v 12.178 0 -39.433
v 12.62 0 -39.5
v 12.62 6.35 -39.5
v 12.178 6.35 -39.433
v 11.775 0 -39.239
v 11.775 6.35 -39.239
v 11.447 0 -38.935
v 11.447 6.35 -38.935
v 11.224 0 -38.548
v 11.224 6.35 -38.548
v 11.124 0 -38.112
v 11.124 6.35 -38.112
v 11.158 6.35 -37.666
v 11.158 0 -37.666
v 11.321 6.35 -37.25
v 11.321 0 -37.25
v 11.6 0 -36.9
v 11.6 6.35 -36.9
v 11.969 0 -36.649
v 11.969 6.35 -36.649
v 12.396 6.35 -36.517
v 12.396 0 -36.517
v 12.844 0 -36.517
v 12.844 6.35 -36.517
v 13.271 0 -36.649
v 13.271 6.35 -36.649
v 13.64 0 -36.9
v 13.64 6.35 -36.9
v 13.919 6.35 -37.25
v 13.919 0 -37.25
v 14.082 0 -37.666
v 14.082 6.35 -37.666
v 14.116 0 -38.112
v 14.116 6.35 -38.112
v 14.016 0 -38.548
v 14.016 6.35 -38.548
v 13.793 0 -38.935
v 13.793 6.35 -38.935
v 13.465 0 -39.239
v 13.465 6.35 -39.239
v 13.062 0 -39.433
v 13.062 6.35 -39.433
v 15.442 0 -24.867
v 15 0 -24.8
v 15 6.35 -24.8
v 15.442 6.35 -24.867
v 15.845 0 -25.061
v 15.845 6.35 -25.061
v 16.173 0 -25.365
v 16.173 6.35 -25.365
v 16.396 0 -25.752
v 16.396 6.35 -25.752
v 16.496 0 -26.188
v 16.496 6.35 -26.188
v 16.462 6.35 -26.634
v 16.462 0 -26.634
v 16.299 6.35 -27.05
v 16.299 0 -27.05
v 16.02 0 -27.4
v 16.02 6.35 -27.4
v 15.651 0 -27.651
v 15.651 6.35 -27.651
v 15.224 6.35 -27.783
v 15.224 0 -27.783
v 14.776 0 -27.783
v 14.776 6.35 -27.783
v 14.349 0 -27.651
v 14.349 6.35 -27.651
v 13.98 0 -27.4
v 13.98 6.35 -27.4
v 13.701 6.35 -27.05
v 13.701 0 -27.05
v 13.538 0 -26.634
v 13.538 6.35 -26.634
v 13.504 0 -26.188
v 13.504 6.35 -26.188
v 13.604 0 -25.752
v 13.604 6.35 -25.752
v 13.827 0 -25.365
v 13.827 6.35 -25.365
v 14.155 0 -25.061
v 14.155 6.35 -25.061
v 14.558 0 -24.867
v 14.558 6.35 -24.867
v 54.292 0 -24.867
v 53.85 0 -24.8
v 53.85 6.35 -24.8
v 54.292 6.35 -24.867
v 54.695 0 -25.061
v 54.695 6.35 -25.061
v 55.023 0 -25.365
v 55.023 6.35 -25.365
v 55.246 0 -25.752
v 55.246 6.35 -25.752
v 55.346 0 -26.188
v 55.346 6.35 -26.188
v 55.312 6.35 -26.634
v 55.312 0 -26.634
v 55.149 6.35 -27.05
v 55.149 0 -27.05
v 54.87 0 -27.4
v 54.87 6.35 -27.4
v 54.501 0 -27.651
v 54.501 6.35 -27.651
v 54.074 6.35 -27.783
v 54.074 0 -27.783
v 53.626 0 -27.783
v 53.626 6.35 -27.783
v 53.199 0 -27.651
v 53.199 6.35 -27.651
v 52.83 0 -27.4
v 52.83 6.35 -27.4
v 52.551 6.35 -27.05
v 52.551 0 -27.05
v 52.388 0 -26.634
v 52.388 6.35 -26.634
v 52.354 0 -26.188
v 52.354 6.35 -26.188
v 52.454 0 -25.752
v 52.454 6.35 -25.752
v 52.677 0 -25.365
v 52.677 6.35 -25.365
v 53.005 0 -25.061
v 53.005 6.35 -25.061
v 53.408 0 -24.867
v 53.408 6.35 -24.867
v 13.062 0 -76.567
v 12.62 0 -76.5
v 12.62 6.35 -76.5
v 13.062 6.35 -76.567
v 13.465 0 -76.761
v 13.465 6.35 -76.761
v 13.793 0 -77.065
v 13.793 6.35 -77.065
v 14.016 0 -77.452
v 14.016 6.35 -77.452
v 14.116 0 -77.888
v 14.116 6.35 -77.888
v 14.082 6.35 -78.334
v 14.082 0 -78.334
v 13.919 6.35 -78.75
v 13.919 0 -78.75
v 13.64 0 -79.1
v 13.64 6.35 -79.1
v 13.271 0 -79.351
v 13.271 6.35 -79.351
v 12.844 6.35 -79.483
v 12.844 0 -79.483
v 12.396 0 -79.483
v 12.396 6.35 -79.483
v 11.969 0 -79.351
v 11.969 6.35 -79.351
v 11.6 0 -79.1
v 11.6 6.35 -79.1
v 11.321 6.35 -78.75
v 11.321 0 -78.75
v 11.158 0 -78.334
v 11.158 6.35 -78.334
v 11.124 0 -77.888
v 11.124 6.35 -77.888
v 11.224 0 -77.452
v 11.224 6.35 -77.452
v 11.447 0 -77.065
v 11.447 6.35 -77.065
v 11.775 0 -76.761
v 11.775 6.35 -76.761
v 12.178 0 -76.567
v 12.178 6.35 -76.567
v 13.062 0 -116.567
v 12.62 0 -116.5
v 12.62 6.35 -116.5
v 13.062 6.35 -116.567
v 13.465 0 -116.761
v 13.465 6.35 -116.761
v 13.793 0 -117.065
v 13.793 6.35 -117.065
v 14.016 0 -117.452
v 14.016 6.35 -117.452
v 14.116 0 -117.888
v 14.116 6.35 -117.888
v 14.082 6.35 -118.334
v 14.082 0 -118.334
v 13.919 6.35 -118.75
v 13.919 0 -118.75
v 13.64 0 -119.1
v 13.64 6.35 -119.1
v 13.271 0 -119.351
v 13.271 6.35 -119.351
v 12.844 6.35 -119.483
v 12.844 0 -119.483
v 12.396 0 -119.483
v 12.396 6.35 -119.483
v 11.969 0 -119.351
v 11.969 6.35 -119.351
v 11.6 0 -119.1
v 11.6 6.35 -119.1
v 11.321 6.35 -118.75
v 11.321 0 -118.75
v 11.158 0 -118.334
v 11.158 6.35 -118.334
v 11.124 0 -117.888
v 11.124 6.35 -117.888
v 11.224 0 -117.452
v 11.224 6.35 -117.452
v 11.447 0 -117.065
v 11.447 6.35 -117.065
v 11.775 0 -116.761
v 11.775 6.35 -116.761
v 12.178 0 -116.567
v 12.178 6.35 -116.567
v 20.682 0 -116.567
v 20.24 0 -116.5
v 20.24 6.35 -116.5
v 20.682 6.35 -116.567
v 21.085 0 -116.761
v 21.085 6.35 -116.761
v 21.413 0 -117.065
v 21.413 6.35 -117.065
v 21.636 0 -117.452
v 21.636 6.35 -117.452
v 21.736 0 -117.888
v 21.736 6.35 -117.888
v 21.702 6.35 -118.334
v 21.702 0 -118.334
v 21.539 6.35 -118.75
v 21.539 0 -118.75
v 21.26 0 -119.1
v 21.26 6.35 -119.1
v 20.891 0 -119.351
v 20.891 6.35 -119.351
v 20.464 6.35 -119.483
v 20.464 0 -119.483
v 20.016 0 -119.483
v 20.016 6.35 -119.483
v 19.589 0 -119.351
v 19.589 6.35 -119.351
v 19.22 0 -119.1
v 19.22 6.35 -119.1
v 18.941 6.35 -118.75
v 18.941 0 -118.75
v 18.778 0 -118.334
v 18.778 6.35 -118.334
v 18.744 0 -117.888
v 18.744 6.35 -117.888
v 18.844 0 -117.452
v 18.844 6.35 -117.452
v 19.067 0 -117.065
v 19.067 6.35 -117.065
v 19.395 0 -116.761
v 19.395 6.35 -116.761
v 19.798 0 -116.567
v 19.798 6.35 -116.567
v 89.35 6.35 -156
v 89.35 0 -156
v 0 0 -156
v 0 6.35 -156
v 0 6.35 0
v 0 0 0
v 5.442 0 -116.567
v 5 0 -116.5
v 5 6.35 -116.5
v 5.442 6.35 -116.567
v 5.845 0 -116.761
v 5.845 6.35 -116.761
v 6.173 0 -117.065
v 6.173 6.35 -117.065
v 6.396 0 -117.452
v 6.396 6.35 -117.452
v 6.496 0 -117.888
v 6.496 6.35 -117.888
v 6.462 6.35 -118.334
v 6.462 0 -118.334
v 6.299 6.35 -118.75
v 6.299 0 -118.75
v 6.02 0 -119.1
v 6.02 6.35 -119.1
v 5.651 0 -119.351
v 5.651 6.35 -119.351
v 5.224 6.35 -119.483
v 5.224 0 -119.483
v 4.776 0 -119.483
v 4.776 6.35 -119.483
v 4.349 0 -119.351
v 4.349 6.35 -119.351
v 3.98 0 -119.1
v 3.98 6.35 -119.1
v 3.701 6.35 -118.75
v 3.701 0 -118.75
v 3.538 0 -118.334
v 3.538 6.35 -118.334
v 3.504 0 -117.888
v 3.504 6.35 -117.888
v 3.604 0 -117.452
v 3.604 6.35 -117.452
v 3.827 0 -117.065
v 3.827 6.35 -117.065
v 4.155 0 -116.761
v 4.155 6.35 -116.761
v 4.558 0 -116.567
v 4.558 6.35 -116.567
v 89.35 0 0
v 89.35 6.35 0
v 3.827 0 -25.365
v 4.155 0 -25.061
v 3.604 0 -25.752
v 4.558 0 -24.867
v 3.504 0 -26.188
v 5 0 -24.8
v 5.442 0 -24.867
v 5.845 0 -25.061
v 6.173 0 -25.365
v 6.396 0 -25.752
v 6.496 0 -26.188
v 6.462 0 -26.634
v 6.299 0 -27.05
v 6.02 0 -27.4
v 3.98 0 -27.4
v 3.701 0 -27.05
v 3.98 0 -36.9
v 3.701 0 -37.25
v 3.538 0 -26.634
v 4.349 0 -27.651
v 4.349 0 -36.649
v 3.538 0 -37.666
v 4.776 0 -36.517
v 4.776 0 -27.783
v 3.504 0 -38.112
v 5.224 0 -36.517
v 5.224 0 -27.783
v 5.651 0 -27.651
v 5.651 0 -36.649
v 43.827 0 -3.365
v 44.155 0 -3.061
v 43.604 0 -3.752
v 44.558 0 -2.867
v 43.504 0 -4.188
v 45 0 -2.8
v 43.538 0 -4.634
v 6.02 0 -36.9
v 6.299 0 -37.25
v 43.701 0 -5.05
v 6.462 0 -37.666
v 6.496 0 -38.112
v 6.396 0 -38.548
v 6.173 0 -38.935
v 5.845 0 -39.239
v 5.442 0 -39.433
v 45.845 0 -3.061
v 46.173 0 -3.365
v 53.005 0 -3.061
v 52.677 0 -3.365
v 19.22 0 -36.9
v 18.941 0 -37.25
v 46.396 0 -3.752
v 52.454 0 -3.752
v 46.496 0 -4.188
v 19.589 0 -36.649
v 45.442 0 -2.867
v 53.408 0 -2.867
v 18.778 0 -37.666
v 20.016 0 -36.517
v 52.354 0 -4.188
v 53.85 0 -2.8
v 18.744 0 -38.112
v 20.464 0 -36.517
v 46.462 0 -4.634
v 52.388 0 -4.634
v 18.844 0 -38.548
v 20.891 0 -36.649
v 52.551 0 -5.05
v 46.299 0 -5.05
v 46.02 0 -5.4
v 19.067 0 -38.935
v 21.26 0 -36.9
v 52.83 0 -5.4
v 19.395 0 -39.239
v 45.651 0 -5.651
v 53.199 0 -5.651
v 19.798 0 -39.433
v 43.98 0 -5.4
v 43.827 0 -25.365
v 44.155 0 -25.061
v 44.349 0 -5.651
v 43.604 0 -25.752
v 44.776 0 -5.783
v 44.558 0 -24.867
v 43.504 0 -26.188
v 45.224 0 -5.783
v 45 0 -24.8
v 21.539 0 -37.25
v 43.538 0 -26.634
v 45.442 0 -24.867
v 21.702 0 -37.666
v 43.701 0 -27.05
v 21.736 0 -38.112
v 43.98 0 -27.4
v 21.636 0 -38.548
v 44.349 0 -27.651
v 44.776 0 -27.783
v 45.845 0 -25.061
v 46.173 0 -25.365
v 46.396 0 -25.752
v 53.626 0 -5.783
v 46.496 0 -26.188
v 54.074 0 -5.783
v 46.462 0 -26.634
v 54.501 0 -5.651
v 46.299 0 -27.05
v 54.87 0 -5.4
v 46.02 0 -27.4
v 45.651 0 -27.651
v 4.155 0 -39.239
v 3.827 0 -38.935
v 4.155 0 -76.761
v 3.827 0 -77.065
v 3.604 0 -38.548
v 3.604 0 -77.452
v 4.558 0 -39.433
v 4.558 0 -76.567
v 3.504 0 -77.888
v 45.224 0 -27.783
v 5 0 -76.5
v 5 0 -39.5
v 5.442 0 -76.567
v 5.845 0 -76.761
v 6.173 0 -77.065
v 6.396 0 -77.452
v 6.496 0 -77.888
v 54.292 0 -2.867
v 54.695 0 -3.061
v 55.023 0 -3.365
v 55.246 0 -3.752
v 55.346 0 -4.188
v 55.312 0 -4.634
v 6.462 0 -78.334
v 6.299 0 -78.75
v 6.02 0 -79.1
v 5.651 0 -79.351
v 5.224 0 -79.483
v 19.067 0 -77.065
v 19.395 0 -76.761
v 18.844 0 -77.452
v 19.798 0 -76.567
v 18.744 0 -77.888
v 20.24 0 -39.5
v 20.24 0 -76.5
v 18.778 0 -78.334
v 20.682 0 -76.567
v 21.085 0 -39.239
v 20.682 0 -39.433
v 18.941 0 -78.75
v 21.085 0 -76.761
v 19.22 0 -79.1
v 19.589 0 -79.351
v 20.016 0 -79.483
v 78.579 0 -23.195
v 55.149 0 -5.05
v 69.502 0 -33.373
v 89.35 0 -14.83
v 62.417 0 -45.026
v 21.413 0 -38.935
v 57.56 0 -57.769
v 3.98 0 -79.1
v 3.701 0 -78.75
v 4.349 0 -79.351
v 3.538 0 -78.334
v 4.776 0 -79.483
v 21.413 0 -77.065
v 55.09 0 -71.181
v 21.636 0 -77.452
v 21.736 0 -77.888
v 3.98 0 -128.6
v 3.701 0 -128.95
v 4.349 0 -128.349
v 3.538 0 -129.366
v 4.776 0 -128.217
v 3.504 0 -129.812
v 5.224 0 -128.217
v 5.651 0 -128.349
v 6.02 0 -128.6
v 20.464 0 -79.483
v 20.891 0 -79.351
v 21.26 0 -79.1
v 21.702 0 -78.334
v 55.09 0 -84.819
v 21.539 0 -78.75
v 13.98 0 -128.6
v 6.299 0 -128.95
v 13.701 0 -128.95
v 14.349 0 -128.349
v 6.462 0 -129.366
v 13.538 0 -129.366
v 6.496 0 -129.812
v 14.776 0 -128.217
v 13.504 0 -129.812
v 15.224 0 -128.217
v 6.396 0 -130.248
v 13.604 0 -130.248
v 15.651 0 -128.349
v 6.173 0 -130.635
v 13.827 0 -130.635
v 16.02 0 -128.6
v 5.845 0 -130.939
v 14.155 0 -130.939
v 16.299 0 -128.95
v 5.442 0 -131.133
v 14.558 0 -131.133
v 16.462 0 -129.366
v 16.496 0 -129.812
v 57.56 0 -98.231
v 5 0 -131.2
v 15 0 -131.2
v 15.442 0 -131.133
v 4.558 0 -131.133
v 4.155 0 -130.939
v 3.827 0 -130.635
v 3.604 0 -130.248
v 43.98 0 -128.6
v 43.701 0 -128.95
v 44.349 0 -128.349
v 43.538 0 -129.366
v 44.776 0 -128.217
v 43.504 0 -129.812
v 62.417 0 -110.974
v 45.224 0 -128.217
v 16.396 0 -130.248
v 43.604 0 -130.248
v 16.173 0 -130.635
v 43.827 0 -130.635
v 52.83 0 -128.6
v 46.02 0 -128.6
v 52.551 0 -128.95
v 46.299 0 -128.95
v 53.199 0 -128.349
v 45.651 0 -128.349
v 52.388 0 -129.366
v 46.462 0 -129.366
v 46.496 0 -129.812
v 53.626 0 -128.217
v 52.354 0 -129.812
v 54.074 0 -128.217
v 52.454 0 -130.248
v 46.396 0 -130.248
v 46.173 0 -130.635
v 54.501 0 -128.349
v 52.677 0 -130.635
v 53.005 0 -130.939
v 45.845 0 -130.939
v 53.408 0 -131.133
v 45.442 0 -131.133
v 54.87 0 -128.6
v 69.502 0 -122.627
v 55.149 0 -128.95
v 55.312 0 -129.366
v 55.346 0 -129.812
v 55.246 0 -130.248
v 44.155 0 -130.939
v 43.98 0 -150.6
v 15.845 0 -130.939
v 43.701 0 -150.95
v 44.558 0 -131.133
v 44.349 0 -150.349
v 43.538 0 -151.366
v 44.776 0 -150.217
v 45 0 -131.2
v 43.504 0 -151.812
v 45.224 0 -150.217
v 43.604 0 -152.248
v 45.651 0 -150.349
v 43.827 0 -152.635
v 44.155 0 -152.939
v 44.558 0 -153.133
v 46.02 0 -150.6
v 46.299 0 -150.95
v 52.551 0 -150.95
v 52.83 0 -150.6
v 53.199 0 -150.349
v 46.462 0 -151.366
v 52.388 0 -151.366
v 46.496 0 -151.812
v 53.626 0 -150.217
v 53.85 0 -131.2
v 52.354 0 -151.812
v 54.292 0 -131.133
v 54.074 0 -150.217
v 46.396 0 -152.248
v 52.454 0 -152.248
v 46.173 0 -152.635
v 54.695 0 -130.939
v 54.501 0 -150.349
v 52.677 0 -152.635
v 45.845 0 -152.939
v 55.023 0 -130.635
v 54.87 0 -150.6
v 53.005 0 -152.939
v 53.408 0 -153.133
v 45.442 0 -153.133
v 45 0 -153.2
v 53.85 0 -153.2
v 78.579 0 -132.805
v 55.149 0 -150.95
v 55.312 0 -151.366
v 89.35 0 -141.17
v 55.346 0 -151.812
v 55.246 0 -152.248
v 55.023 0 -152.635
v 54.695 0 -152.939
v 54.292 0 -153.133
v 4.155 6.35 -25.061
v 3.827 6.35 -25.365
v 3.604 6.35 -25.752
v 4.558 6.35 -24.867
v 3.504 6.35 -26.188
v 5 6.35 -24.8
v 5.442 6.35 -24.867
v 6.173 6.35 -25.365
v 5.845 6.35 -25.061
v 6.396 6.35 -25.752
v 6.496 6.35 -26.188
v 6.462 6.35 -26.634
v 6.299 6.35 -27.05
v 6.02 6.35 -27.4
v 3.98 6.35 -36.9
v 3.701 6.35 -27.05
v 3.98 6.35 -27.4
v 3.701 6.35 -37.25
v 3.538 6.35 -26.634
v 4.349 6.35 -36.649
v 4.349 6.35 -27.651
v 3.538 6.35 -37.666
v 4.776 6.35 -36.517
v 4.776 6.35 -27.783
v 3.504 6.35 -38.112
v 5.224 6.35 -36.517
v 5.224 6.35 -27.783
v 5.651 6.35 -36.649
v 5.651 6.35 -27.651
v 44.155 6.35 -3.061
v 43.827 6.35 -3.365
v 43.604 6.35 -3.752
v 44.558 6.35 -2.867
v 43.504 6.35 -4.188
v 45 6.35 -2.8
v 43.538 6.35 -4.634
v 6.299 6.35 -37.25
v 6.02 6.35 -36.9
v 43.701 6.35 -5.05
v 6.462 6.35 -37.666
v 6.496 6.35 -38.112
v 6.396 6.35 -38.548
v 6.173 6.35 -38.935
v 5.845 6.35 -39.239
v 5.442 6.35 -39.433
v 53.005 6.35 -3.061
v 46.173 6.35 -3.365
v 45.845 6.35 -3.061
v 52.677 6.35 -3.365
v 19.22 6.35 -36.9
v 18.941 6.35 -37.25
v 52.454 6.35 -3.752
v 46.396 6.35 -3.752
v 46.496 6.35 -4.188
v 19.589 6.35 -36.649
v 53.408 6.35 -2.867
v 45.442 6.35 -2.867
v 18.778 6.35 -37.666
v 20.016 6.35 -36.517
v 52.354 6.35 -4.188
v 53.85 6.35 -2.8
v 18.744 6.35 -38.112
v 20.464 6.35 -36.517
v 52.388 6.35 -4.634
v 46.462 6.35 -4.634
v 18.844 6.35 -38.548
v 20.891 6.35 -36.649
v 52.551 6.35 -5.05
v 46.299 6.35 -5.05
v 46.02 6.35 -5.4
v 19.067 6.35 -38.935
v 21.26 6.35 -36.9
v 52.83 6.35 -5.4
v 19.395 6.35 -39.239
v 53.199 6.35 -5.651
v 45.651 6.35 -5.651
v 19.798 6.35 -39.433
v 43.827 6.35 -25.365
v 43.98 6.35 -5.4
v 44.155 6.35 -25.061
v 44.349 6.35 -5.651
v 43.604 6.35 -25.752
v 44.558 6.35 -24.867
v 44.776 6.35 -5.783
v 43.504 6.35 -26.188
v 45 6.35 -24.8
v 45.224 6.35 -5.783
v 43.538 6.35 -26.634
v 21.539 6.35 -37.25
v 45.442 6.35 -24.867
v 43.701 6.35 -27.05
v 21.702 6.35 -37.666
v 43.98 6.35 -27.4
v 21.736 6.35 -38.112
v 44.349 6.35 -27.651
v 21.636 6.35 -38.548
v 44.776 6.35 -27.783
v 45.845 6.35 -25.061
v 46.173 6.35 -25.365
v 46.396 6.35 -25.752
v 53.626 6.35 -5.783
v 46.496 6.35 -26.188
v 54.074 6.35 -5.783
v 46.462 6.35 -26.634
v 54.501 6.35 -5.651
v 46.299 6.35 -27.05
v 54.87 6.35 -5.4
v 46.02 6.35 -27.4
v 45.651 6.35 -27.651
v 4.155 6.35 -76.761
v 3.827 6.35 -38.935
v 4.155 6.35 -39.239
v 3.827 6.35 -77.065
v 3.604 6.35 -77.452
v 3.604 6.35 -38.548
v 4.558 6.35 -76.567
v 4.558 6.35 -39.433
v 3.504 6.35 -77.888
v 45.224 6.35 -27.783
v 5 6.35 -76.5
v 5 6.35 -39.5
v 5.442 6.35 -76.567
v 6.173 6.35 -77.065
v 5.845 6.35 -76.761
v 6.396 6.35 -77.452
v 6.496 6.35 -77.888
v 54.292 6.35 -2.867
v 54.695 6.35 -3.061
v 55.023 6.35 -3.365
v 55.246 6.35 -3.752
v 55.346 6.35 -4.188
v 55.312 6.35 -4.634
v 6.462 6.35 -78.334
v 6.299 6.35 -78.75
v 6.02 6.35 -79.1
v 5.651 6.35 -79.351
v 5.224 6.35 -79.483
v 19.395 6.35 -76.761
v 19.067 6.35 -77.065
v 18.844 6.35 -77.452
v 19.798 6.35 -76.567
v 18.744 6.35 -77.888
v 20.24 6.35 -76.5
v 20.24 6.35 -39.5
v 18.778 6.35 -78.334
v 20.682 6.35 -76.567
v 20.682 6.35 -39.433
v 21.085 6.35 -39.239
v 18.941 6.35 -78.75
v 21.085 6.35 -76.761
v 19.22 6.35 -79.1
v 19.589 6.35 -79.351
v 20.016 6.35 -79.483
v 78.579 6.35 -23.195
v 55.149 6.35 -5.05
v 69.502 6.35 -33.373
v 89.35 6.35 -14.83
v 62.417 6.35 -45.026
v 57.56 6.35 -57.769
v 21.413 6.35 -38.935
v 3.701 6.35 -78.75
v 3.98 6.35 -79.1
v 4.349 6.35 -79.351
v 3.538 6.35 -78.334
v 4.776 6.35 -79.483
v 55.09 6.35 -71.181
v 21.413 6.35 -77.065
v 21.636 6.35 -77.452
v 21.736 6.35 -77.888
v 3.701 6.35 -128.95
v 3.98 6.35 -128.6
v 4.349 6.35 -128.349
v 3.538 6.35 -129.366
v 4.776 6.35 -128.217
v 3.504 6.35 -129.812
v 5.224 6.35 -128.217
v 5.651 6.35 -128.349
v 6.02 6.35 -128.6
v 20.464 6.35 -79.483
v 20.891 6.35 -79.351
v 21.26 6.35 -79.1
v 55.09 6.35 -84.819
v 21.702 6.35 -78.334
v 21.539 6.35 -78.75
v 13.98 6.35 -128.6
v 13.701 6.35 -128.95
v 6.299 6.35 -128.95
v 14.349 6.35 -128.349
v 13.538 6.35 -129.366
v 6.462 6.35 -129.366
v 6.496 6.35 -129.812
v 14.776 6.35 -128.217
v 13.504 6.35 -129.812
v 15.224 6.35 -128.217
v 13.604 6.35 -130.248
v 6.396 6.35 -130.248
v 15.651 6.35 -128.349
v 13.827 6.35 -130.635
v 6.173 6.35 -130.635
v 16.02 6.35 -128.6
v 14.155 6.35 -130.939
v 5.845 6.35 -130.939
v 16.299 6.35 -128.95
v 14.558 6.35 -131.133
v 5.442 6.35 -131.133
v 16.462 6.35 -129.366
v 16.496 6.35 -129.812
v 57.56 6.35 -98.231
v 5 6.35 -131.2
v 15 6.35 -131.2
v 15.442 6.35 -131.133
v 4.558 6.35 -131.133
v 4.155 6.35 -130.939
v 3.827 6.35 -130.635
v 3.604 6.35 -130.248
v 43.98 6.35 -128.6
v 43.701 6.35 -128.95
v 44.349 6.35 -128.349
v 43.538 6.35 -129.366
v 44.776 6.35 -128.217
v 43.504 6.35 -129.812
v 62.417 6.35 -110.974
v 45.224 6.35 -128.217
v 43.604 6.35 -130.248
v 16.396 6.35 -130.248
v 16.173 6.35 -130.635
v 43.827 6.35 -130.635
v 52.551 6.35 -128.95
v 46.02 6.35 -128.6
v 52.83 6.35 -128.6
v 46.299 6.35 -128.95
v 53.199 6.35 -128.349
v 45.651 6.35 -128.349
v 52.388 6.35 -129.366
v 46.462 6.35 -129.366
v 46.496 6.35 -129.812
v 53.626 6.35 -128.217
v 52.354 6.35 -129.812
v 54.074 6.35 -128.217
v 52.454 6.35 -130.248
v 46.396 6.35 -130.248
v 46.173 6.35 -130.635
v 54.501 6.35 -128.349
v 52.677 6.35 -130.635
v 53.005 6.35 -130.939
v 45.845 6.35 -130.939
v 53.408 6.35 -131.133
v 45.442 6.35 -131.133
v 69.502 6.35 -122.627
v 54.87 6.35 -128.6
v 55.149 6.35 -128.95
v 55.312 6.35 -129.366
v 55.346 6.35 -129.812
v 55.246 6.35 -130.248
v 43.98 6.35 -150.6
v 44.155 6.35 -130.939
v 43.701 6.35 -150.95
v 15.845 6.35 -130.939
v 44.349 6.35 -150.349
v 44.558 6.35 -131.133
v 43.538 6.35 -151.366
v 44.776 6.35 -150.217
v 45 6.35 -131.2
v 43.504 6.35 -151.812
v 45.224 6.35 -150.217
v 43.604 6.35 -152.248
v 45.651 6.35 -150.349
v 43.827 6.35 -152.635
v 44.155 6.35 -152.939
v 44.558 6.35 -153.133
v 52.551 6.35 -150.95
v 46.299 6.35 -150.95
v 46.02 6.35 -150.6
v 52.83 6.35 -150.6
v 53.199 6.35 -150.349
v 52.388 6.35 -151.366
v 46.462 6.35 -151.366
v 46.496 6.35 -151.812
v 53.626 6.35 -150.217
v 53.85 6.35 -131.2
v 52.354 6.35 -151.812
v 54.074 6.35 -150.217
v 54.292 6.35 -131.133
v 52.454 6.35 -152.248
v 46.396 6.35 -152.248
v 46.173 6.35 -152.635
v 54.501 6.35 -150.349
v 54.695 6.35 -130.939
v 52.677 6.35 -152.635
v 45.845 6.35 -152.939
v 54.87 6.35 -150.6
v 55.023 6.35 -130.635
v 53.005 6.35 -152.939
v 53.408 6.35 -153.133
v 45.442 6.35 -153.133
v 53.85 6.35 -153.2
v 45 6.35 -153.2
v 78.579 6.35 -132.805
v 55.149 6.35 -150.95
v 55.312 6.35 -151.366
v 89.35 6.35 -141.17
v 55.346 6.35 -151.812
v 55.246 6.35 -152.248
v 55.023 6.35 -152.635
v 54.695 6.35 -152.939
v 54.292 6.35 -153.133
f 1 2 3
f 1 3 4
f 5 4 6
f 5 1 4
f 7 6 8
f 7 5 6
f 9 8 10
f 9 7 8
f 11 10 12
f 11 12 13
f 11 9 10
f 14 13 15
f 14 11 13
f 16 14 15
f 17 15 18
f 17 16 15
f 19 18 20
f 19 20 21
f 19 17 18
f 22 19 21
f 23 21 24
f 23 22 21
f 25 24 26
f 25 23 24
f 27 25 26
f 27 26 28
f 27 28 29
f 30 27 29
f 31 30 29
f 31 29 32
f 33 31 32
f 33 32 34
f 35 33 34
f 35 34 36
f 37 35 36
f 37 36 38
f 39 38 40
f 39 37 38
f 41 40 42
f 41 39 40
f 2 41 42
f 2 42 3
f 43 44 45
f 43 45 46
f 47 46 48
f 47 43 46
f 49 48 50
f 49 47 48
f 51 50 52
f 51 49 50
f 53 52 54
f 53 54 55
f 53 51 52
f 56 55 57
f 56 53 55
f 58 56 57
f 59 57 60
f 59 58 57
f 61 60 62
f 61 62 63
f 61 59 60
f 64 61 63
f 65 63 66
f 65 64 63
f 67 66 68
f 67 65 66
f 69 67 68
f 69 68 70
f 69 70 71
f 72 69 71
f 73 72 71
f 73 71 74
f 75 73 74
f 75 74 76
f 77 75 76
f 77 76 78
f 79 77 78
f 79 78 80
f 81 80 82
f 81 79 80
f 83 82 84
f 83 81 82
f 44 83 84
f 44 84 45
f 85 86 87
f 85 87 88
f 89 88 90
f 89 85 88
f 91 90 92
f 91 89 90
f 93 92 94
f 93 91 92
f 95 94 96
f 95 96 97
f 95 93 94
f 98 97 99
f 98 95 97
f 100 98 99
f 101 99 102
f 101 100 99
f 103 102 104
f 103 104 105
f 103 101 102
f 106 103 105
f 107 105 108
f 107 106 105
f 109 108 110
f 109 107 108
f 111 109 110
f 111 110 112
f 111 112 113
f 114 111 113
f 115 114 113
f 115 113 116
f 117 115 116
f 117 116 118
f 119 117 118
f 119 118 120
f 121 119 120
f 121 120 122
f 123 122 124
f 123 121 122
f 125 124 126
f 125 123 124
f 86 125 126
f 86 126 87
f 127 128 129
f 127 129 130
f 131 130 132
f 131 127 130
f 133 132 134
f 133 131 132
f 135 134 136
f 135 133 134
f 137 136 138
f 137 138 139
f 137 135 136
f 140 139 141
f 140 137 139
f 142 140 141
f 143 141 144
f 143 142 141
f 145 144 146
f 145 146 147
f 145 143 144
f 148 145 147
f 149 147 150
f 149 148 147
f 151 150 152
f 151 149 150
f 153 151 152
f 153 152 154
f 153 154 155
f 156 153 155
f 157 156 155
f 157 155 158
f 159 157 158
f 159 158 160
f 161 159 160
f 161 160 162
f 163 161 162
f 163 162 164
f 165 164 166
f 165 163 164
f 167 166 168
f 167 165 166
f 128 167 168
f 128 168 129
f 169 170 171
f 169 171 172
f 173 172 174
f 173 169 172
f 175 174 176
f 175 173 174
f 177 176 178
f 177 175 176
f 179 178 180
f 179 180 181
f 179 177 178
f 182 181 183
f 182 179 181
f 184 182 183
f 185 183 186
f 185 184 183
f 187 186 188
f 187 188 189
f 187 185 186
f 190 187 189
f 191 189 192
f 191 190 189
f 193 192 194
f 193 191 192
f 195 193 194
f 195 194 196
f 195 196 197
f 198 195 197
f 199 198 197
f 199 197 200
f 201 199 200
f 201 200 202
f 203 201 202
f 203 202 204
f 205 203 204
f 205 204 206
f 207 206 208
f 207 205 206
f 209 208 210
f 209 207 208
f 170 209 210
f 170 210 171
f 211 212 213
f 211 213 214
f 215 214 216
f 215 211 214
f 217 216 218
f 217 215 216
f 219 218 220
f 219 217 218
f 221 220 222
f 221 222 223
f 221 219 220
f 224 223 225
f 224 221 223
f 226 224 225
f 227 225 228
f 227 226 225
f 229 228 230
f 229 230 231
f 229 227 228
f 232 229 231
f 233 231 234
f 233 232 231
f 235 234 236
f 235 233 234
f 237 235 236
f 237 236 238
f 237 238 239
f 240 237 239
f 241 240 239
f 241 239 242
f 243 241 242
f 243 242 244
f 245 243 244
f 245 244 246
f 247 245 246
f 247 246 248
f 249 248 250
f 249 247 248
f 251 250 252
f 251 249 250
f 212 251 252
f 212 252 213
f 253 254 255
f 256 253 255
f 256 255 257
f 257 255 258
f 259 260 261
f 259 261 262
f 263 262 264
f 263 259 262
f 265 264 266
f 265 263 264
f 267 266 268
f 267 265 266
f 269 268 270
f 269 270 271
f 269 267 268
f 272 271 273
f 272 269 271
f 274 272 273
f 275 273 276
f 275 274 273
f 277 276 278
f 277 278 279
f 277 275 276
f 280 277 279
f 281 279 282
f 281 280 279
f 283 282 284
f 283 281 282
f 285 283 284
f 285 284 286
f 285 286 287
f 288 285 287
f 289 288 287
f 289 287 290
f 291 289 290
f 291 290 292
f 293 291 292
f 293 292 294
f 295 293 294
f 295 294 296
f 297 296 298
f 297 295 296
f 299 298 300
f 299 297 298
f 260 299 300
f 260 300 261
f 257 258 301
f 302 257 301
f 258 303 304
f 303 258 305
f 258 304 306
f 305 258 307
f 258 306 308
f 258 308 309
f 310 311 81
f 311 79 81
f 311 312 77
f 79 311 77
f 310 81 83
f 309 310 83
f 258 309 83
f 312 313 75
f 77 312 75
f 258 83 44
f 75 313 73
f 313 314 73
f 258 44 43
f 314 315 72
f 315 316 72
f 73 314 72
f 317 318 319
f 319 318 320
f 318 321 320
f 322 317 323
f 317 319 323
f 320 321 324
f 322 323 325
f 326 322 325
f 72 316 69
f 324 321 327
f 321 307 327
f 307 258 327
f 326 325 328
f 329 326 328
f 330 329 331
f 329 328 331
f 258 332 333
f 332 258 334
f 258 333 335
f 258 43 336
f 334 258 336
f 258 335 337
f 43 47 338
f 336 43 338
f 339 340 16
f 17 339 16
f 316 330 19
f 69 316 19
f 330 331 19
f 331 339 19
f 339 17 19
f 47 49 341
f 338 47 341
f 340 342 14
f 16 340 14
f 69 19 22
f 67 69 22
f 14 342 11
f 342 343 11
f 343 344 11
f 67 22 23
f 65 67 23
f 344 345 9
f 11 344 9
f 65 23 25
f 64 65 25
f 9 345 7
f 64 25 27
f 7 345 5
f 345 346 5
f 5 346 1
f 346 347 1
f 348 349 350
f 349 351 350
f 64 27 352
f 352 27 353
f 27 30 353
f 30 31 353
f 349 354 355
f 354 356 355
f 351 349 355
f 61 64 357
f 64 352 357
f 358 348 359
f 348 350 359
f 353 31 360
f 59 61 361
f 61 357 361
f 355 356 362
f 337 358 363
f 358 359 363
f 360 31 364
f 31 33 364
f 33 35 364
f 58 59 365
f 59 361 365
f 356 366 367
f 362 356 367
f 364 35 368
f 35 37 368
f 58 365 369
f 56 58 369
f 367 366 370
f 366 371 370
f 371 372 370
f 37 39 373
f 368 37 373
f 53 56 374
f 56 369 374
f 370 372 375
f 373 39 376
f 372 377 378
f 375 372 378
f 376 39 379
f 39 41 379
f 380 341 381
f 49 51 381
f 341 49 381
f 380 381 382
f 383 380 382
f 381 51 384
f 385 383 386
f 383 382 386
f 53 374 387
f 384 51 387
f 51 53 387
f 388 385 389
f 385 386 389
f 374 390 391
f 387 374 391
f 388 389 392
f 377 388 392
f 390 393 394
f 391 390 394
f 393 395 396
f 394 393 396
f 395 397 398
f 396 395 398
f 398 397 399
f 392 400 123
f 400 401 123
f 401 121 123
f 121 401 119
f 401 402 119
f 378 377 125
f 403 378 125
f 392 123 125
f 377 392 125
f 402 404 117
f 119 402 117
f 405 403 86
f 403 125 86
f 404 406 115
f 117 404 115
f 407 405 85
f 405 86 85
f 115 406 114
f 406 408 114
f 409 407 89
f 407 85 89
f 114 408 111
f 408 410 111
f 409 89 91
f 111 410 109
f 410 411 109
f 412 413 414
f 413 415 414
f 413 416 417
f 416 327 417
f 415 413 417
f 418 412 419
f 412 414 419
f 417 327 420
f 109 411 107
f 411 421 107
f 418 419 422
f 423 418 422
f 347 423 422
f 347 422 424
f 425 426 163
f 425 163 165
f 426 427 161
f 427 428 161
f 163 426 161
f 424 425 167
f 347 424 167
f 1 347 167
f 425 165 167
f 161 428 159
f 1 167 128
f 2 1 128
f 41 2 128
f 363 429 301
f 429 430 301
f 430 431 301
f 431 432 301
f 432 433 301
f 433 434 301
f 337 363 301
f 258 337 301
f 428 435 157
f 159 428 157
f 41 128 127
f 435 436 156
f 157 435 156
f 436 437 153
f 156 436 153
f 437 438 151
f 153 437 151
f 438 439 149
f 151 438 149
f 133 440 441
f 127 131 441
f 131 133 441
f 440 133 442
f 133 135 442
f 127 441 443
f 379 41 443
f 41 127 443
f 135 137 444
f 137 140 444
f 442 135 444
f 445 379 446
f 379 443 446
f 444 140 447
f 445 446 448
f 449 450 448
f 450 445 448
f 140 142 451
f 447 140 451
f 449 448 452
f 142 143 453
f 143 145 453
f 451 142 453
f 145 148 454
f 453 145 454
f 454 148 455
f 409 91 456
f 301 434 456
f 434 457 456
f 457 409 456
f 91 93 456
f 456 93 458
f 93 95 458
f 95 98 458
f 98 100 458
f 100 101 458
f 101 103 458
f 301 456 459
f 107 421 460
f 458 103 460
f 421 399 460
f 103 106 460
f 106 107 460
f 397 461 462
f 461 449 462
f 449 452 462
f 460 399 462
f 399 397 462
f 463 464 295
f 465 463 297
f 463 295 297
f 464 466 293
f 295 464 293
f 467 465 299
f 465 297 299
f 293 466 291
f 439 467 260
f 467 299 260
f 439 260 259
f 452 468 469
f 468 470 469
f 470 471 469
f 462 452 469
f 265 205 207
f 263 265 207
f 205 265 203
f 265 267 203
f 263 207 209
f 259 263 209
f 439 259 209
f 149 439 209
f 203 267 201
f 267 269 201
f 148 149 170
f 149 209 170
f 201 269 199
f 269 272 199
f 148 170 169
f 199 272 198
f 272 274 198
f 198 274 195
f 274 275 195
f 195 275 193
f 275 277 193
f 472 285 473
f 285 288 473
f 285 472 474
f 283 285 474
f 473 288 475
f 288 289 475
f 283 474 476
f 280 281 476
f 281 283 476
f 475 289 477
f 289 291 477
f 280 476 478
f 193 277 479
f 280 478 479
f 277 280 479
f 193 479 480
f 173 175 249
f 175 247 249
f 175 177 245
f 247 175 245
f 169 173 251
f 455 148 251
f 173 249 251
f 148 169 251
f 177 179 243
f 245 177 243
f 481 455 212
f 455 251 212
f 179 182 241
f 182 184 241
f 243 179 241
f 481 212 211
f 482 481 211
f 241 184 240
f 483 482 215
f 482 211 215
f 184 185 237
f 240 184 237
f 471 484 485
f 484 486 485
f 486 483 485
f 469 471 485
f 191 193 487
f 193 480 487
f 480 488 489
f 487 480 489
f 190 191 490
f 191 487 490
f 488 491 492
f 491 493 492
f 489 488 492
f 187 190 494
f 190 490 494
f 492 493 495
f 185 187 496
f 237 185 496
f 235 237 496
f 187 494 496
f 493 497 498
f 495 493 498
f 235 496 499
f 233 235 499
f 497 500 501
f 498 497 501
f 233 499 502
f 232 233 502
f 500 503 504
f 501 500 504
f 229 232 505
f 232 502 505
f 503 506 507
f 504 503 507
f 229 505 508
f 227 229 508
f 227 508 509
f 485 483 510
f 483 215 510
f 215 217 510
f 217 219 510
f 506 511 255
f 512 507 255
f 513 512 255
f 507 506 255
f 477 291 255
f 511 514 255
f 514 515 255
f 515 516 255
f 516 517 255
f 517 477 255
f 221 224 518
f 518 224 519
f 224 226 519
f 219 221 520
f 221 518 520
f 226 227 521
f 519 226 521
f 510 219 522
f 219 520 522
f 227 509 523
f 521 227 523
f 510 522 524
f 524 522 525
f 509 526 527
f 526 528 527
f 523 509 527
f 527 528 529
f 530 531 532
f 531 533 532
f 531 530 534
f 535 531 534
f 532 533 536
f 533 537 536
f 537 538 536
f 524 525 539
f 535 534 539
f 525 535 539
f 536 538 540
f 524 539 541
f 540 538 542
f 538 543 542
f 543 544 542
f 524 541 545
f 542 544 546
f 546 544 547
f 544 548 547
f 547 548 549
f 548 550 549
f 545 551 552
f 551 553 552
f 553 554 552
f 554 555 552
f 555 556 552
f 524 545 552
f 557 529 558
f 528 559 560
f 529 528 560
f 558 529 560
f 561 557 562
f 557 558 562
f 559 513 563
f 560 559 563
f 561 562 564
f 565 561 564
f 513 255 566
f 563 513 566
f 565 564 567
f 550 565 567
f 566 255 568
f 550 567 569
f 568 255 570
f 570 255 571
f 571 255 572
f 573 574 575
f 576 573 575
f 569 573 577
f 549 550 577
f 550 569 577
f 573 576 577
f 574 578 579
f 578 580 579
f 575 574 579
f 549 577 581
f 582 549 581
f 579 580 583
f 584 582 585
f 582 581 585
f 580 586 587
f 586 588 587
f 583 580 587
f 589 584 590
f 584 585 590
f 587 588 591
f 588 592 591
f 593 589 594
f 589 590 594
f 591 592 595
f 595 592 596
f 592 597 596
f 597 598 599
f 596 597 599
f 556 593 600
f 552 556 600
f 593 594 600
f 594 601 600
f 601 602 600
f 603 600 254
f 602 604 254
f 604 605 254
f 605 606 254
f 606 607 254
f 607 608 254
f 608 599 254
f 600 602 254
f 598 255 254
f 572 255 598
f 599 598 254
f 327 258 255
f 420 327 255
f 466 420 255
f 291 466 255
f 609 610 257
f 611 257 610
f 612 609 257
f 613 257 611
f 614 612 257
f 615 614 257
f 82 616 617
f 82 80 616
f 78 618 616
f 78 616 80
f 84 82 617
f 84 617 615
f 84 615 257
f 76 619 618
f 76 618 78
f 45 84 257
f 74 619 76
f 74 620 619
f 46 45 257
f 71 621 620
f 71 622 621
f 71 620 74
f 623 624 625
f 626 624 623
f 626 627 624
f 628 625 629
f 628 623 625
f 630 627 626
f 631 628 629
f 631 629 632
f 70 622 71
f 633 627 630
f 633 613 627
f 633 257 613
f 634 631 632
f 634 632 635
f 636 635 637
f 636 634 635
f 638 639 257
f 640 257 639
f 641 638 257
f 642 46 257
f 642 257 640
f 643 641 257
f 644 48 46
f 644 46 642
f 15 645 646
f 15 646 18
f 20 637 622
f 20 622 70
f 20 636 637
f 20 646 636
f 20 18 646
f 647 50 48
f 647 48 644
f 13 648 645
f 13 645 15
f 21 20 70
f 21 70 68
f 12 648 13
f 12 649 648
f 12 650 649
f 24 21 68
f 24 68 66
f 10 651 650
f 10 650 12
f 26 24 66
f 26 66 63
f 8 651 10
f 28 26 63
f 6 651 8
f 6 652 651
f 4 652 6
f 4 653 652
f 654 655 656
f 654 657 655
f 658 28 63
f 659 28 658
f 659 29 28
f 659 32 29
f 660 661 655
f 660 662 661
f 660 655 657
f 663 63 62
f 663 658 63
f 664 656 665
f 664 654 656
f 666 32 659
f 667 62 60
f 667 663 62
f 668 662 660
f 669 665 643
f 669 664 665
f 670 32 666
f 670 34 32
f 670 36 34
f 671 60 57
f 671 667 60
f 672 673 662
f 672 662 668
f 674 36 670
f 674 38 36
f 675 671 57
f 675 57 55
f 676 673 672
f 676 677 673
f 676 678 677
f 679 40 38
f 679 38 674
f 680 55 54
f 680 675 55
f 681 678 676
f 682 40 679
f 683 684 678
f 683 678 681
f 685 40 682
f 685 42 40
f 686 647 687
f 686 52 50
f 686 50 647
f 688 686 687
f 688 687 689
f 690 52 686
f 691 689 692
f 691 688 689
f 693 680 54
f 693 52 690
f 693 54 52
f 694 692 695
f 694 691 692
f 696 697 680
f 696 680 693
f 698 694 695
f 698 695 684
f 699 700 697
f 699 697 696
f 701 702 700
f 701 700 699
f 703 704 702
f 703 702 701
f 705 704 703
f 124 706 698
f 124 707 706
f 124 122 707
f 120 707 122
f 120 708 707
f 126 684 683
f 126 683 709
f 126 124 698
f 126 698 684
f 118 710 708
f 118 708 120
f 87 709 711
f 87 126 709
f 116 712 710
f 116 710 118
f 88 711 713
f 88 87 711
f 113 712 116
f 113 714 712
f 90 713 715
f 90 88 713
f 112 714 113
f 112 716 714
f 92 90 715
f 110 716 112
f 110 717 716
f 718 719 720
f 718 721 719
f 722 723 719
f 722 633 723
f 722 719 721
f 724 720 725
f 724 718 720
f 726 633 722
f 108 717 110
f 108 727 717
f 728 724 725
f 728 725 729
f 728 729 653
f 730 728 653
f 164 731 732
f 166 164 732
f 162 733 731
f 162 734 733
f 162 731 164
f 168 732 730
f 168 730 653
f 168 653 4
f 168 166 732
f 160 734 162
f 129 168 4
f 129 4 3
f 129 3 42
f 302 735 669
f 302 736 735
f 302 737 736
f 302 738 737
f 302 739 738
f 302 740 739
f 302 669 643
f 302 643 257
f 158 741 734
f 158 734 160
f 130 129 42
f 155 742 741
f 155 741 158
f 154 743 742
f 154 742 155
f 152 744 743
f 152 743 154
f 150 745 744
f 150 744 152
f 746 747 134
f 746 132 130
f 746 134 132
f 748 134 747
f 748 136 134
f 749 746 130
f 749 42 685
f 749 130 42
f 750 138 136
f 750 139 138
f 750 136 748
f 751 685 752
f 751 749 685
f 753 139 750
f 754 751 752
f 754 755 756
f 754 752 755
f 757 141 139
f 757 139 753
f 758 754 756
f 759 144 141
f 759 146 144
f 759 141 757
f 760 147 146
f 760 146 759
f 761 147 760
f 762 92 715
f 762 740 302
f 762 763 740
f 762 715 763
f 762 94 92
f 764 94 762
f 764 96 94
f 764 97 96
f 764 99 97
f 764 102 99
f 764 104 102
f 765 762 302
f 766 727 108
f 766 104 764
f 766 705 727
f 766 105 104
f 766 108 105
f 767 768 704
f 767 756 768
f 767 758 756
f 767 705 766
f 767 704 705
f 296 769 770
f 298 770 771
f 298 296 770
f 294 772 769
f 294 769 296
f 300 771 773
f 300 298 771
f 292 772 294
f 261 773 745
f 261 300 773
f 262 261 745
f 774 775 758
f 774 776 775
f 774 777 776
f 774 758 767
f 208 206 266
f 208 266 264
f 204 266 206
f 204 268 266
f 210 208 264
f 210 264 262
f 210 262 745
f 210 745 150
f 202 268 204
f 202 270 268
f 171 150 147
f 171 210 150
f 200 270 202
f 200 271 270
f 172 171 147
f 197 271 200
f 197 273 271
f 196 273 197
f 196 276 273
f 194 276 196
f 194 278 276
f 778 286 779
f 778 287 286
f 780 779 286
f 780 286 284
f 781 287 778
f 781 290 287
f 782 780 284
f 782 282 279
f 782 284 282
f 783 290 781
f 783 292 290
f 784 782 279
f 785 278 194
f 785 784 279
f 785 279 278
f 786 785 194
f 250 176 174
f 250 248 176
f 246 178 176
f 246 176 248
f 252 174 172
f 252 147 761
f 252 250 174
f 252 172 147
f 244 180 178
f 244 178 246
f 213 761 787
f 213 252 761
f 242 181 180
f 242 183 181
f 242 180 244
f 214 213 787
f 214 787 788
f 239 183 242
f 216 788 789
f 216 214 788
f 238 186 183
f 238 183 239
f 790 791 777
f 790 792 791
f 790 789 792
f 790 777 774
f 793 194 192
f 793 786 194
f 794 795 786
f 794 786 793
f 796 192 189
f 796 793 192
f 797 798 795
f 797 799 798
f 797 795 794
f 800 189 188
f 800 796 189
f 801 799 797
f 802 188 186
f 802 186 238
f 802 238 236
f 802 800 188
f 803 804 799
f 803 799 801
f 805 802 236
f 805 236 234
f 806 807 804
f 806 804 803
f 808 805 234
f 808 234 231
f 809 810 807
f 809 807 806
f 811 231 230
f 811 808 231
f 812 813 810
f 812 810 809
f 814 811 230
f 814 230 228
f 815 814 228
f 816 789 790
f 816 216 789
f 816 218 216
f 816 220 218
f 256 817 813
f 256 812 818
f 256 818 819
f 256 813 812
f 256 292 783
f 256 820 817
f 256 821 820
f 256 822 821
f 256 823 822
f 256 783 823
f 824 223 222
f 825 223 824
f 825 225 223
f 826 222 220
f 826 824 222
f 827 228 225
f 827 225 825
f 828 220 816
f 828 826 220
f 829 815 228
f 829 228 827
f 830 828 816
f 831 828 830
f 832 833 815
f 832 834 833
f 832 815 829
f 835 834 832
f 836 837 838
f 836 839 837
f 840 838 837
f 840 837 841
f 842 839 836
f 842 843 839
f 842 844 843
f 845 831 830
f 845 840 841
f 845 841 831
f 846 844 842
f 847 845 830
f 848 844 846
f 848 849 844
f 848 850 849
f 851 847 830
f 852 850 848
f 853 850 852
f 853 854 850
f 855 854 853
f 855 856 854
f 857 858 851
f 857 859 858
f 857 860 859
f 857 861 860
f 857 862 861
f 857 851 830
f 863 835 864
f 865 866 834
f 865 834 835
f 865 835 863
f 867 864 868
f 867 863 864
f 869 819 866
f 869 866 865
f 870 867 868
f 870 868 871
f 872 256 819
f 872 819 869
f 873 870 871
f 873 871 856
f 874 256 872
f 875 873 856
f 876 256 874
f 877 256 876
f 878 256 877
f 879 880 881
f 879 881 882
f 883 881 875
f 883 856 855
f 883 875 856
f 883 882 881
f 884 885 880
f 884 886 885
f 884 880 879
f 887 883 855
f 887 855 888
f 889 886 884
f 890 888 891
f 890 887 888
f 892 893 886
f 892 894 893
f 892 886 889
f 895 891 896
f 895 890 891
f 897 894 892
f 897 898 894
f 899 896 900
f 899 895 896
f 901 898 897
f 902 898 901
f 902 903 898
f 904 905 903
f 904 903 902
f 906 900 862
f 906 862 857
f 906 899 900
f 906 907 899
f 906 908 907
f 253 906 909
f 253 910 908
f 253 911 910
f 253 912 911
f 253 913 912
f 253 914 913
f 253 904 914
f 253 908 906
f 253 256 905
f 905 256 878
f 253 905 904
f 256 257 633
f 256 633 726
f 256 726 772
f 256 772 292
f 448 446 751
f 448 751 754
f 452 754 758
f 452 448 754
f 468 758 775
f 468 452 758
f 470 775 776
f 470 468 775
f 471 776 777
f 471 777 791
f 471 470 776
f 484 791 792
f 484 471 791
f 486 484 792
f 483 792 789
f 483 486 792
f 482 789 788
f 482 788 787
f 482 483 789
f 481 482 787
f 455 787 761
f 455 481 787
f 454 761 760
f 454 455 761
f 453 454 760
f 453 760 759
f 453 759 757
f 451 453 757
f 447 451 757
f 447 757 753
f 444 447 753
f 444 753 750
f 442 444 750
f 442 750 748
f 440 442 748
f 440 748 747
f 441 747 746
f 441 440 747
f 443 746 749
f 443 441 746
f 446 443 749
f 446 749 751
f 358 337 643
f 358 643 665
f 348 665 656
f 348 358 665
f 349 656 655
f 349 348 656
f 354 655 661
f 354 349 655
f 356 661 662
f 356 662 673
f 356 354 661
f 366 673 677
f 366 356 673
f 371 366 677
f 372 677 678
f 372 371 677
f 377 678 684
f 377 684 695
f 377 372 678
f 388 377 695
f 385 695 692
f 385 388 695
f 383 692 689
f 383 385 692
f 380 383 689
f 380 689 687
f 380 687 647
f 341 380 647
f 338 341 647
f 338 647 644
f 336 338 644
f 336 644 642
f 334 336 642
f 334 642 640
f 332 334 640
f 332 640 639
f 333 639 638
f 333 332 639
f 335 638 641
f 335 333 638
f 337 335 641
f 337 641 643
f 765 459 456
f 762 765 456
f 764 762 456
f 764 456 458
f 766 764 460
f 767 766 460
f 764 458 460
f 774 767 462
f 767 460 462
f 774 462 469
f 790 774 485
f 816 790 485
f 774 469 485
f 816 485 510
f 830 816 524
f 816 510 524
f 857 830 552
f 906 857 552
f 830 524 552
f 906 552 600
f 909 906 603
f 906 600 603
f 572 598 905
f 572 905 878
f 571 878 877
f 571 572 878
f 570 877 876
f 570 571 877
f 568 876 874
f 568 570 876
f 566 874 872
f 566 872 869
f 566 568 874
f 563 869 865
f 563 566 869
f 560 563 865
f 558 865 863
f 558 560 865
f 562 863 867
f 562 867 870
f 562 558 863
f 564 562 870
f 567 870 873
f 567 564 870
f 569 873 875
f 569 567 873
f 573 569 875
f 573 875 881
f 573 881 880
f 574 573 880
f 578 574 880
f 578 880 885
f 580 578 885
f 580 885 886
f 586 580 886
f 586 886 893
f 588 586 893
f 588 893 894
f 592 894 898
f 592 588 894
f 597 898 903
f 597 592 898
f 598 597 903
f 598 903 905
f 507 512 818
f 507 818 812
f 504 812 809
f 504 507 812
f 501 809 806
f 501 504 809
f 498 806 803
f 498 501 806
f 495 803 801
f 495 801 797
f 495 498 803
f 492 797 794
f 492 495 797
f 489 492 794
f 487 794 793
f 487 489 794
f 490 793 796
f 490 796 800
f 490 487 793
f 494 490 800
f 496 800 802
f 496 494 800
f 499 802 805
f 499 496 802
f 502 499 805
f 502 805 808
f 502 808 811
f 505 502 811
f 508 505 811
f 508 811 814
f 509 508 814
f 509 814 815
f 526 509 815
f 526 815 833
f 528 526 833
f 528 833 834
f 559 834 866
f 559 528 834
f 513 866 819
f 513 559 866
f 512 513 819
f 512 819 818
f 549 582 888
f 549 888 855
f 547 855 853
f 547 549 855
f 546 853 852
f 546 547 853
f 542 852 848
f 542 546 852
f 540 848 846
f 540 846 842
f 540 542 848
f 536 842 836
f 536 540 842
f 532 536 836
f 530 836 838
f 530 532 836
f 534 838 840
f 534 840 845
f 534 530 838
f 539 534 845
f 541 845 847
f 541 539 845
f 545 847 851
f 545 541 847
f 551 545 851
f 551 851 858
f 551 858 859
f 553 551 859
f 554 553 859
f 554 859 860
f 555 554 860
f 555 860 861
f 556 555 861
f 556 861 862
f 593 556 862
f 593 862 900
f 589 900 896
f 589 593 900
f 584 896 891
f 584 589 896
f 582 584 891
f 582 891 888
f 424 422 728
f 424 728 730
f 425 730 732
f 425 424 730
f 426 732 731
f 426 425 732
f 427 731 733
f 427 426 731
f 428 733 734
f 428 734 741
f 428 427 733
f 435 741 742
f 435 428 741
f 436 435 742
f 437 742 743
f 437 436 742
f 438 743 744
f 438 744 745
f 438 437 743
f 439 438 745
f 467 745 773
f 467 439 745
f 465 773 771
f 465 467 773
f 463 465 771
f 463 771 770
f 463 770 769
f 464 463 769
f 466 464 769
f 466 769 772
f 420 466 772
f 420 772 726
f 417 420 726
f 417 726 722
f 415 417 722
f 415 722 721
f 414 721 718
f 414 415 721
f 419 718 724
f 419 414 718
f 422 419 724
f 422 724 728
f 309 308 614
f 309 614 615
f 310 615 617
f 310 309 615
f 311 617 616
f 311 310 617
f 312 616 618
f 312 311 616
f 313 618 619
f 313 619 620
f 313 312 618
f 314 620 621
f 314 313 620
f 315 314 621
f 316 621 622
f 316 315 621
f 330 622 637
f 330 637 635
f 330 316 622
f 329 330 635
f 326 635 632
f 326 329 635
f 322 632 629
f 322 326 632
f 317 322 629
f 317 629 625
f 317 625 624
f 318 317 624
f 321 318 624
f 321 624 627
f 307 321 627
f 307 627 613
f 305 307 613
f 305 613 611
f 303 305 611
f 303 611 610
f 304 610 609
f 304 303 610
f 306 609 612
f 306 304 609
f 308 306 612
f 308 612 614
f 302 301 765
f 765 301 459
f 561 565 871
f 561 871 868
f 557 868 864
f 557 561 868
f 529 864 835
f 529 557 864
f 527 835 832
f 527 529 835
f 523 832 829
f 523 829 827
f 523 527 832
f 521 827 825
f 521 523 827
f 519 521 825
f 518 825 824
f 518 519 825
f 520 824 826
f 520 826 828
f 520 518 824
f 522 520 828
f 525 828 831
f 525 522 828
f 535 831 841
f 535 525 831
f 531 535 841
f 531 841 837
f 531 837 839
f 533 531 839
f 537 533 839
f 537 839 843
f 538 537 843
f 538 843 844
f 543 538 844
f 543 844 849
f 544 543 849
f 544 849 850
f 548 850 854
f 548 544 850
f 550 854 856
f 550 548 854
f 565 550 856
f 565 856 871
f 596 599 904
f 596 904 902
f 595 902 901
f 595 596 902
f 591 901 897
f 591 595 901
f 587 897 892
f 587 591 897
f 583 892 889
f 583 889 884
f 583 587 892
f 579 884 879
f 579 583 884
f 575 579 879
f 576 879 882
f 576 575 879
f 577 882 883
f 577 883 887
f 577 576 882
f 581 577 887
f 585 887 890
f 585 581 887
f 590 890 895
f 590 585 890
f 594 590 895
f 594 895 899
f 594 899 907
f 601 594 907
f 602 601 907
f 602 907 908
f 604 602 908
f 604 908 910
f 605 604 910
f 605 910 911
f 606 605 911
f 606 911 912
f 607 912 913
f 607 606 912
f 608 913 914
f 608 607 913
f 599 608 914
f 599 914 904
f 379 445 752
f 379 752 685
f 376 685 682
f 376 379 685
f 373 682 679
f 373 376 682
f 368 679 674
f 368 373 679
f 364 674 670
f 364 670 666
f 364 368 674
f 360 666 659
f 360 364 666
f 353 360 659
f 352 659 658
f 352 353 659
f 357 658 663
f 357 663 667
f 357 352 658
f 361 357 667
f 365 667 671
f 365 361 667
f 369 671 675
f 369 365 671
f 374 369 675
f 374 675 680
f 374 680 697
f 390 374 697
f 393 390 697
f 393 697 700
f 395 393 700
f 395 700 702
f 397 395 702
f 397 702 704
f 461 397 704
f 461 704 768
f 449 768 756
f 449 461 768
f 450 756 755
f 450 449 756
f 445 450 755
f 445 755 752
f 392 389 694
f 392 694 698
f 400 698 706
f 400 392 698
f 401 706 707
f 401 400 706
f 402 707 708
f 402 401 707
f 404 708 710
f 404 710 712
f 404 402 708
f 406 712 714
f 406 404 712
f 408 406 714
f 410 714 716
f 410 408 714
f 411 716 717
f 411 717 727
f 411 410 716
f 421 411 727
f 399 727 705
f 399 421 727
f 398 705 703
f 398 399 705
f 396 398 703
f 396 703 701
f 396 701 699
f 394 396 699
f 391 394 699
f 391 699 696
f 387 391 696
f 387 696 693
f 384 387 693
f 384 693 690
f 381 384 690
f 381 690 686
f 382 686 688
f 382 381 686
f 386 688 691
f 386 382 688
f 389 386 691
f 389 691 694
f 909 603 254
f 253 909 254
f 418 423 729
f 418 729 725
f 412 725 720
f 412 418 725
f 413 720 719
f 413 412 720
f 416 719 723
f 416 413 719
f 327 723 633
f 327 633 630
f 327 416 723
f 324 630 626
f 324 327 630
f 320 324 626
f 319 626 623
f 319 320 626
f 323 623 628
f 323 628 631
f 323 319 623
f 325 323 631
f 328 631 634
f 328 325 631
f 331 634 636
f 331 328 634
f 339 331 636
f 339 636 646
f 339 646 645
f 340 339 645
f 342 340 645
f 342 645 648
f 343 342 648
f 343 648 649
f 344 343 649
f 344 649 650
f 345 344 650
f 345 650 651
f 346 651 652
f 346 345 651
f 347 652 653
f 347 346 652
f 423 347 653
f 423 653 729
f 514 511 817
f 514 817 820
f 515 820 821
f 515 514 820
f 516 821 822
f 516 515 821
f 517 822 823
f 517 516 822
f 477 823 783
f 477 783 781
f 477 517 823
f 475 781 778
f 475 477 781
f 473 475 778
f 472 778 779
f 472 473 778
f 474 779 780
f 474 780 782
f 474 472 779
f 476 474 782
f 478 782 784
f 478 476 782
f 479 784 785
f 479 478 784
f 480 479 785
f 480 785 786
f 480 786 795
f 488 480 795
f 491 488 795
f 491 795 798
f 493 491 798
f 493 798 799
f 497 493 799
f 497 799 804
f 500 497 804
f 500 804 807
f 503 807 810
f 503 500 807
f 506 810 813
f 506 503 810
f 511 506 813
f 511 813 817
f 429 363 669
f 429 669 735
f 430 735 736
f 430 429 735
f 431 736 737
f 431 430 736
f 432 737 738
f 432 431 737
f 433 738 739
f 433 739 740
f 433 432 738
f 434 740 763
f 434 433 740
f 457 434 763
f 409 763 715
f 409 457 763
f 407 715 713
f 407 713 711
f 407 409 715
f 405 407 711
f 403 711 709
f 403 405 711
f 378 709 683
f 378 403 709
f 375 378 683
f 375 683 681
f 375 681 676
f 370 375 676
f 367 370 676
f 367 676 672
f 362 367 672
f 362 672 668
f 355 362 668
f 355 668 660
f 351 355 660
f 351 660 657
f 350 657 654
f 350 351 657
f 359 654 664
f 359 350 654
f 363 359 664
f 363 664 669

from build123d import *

# Parameters (mm, degrees)
SKETCH1_R           = 1.5
BOSS_EXTRUDE1_DEPTH = 6.35


with BuildPart() as part:
    # Sketch1 → Boss-Extrude1 (new body)
    with BuildSketch(Plane(origin=(0, 0, 0), x_dir=(1, 0, 0), z_dir=(0, 1, 0))):
        with BuildLine():
            Line((0, 0), (49.85, 0))
            Line((49.85, 0), (57.85, 0))
            Line((57.85, 0), (89.35, 0))
            Line((89.35, 0), (89.35, 14.83))
            ThreePointArc((89.35, 14.83), (54.779581991, 78), (89.35, 141.17))
            Line((89.35, 141.17), (89.35, 156))
            Line((89.35, 156), (57.85, 156))
            Line((57.85, 156), (49.85, 156))
            Line((49.85, 156), (0, 156))
            Line((0, 156), (0, 124.7))
            Line((0, 124.7), (0, 31.3))
            Line((0, 31.3), (0, 0))
        make_face()
        with Locations(Location((45, 26.3, 0), (0, 0, 270))):
            Circle(SKETCH1_R, mode=Mode.SUBTRACT)
        with Locations(Location((45, 4.3, 0), (0, 0, 270))):
            Circle(SKETCH1_R, mode=Mode.SUBTRACT)
        with Locations(Location((15, 26.3, 0), (0, 0, 270))):
            Circle(SKETCH1_R, mode=Mode.SUBTRACT)
        with Locations(Location((5, 26.3, 0), (0, 0, 270))):
            Circle(SKETCH1_R, mode=Mode.SUBTRACT)
        with Locations(Location((53.85, 26.3, 0), (0, 0, 270))):
            Circle(SKETCH1_R, mode=Mode.SUBTRACT)
        with Locations(Location((53.85, 4.3, 0), (0, 0, 270))):
            Circle(SKETCH1_R, mode=Mode.SUBTRACT)
        with Locations(Location((53.85, 151.7, 0), (0, 0, 90))):
            Circle(SKETCH1_R, mode=Mode.SUBTRACT)
        with Locations(Location((53.85, 129.7, 0), (0, 0, 90))):
            Circle(SKETCH1_R, mode=Mode.SUBTRACT)
        with Locations(Location((5, 129.7, 0), (0, 0, 90))):
            Circle(SKETCH1_R, mode=Mode.SUBTRACT)
        with Locations(Location((15, 129.7, 0), (0, 0, 90))):
            Circle(SKETCH1_R, mode=Mode.SUBTRACT)
        with Locations(Location((45, 151.7, 0), (0, 0, 90))):
            Circle(SKETCH1_R, mode=Mode.SUBTRACT)
        with Locations(Location((45, 129.7, 0), (0, 0, 90))):
            Circle(SKETCH1_R, mode=Mode.SUBTRACT)
        with Locations(Location((5, 118, 0), (0, 0, 270))):
            Circle(SKETCH1_R, mode=Mode.SUBTRACT)
        with Locations(Location((5, 78, 0), (0, 0, 270))):
            Circle(SKETCH1_R, mode=Mode.SUBTRACT)
        with Locations(Location((5, 38, 0), (0, 0, 90))):
            Circle(SKETCH1_R, mode=Mode.SUBTRACT)
        with Locations(Location((12.62, 38, 0), (0, 0, 90))):
            Circle(SKETCH1_R, mode=Mode.SUBTRACT)
        with Locations(Location((12.62, 78, 0), (0, 0, 270))):
            Circle(SKETCH1_R, mode=Mode.SUBTRACT)
        with Locations(Location((12.62, 118, 0), (0, 0, 270))):
            Circle(SKETCH1_R, mode=Mode.SUBTRACT)
        with Locations(Location((20.24, 38, 0), (0, 0, 90))):
            Circle(SKETCH1_R, mode=Mode.SUBTRACT)
        with Locations(Location((20.24, 78, 0), (0, 0, 270))):
            Circle(SKETCH1_R, mode=Mode.SUBTRACT)
        with Locations(Location((20.24, 118, 0), (0, 0, 270))):
            Circle(SKETCH1_R, mode=Mode.SUBTRACT)
    extrude(amount=BOSS_EXTRUDE1_DEPTH)


solid = part.part
